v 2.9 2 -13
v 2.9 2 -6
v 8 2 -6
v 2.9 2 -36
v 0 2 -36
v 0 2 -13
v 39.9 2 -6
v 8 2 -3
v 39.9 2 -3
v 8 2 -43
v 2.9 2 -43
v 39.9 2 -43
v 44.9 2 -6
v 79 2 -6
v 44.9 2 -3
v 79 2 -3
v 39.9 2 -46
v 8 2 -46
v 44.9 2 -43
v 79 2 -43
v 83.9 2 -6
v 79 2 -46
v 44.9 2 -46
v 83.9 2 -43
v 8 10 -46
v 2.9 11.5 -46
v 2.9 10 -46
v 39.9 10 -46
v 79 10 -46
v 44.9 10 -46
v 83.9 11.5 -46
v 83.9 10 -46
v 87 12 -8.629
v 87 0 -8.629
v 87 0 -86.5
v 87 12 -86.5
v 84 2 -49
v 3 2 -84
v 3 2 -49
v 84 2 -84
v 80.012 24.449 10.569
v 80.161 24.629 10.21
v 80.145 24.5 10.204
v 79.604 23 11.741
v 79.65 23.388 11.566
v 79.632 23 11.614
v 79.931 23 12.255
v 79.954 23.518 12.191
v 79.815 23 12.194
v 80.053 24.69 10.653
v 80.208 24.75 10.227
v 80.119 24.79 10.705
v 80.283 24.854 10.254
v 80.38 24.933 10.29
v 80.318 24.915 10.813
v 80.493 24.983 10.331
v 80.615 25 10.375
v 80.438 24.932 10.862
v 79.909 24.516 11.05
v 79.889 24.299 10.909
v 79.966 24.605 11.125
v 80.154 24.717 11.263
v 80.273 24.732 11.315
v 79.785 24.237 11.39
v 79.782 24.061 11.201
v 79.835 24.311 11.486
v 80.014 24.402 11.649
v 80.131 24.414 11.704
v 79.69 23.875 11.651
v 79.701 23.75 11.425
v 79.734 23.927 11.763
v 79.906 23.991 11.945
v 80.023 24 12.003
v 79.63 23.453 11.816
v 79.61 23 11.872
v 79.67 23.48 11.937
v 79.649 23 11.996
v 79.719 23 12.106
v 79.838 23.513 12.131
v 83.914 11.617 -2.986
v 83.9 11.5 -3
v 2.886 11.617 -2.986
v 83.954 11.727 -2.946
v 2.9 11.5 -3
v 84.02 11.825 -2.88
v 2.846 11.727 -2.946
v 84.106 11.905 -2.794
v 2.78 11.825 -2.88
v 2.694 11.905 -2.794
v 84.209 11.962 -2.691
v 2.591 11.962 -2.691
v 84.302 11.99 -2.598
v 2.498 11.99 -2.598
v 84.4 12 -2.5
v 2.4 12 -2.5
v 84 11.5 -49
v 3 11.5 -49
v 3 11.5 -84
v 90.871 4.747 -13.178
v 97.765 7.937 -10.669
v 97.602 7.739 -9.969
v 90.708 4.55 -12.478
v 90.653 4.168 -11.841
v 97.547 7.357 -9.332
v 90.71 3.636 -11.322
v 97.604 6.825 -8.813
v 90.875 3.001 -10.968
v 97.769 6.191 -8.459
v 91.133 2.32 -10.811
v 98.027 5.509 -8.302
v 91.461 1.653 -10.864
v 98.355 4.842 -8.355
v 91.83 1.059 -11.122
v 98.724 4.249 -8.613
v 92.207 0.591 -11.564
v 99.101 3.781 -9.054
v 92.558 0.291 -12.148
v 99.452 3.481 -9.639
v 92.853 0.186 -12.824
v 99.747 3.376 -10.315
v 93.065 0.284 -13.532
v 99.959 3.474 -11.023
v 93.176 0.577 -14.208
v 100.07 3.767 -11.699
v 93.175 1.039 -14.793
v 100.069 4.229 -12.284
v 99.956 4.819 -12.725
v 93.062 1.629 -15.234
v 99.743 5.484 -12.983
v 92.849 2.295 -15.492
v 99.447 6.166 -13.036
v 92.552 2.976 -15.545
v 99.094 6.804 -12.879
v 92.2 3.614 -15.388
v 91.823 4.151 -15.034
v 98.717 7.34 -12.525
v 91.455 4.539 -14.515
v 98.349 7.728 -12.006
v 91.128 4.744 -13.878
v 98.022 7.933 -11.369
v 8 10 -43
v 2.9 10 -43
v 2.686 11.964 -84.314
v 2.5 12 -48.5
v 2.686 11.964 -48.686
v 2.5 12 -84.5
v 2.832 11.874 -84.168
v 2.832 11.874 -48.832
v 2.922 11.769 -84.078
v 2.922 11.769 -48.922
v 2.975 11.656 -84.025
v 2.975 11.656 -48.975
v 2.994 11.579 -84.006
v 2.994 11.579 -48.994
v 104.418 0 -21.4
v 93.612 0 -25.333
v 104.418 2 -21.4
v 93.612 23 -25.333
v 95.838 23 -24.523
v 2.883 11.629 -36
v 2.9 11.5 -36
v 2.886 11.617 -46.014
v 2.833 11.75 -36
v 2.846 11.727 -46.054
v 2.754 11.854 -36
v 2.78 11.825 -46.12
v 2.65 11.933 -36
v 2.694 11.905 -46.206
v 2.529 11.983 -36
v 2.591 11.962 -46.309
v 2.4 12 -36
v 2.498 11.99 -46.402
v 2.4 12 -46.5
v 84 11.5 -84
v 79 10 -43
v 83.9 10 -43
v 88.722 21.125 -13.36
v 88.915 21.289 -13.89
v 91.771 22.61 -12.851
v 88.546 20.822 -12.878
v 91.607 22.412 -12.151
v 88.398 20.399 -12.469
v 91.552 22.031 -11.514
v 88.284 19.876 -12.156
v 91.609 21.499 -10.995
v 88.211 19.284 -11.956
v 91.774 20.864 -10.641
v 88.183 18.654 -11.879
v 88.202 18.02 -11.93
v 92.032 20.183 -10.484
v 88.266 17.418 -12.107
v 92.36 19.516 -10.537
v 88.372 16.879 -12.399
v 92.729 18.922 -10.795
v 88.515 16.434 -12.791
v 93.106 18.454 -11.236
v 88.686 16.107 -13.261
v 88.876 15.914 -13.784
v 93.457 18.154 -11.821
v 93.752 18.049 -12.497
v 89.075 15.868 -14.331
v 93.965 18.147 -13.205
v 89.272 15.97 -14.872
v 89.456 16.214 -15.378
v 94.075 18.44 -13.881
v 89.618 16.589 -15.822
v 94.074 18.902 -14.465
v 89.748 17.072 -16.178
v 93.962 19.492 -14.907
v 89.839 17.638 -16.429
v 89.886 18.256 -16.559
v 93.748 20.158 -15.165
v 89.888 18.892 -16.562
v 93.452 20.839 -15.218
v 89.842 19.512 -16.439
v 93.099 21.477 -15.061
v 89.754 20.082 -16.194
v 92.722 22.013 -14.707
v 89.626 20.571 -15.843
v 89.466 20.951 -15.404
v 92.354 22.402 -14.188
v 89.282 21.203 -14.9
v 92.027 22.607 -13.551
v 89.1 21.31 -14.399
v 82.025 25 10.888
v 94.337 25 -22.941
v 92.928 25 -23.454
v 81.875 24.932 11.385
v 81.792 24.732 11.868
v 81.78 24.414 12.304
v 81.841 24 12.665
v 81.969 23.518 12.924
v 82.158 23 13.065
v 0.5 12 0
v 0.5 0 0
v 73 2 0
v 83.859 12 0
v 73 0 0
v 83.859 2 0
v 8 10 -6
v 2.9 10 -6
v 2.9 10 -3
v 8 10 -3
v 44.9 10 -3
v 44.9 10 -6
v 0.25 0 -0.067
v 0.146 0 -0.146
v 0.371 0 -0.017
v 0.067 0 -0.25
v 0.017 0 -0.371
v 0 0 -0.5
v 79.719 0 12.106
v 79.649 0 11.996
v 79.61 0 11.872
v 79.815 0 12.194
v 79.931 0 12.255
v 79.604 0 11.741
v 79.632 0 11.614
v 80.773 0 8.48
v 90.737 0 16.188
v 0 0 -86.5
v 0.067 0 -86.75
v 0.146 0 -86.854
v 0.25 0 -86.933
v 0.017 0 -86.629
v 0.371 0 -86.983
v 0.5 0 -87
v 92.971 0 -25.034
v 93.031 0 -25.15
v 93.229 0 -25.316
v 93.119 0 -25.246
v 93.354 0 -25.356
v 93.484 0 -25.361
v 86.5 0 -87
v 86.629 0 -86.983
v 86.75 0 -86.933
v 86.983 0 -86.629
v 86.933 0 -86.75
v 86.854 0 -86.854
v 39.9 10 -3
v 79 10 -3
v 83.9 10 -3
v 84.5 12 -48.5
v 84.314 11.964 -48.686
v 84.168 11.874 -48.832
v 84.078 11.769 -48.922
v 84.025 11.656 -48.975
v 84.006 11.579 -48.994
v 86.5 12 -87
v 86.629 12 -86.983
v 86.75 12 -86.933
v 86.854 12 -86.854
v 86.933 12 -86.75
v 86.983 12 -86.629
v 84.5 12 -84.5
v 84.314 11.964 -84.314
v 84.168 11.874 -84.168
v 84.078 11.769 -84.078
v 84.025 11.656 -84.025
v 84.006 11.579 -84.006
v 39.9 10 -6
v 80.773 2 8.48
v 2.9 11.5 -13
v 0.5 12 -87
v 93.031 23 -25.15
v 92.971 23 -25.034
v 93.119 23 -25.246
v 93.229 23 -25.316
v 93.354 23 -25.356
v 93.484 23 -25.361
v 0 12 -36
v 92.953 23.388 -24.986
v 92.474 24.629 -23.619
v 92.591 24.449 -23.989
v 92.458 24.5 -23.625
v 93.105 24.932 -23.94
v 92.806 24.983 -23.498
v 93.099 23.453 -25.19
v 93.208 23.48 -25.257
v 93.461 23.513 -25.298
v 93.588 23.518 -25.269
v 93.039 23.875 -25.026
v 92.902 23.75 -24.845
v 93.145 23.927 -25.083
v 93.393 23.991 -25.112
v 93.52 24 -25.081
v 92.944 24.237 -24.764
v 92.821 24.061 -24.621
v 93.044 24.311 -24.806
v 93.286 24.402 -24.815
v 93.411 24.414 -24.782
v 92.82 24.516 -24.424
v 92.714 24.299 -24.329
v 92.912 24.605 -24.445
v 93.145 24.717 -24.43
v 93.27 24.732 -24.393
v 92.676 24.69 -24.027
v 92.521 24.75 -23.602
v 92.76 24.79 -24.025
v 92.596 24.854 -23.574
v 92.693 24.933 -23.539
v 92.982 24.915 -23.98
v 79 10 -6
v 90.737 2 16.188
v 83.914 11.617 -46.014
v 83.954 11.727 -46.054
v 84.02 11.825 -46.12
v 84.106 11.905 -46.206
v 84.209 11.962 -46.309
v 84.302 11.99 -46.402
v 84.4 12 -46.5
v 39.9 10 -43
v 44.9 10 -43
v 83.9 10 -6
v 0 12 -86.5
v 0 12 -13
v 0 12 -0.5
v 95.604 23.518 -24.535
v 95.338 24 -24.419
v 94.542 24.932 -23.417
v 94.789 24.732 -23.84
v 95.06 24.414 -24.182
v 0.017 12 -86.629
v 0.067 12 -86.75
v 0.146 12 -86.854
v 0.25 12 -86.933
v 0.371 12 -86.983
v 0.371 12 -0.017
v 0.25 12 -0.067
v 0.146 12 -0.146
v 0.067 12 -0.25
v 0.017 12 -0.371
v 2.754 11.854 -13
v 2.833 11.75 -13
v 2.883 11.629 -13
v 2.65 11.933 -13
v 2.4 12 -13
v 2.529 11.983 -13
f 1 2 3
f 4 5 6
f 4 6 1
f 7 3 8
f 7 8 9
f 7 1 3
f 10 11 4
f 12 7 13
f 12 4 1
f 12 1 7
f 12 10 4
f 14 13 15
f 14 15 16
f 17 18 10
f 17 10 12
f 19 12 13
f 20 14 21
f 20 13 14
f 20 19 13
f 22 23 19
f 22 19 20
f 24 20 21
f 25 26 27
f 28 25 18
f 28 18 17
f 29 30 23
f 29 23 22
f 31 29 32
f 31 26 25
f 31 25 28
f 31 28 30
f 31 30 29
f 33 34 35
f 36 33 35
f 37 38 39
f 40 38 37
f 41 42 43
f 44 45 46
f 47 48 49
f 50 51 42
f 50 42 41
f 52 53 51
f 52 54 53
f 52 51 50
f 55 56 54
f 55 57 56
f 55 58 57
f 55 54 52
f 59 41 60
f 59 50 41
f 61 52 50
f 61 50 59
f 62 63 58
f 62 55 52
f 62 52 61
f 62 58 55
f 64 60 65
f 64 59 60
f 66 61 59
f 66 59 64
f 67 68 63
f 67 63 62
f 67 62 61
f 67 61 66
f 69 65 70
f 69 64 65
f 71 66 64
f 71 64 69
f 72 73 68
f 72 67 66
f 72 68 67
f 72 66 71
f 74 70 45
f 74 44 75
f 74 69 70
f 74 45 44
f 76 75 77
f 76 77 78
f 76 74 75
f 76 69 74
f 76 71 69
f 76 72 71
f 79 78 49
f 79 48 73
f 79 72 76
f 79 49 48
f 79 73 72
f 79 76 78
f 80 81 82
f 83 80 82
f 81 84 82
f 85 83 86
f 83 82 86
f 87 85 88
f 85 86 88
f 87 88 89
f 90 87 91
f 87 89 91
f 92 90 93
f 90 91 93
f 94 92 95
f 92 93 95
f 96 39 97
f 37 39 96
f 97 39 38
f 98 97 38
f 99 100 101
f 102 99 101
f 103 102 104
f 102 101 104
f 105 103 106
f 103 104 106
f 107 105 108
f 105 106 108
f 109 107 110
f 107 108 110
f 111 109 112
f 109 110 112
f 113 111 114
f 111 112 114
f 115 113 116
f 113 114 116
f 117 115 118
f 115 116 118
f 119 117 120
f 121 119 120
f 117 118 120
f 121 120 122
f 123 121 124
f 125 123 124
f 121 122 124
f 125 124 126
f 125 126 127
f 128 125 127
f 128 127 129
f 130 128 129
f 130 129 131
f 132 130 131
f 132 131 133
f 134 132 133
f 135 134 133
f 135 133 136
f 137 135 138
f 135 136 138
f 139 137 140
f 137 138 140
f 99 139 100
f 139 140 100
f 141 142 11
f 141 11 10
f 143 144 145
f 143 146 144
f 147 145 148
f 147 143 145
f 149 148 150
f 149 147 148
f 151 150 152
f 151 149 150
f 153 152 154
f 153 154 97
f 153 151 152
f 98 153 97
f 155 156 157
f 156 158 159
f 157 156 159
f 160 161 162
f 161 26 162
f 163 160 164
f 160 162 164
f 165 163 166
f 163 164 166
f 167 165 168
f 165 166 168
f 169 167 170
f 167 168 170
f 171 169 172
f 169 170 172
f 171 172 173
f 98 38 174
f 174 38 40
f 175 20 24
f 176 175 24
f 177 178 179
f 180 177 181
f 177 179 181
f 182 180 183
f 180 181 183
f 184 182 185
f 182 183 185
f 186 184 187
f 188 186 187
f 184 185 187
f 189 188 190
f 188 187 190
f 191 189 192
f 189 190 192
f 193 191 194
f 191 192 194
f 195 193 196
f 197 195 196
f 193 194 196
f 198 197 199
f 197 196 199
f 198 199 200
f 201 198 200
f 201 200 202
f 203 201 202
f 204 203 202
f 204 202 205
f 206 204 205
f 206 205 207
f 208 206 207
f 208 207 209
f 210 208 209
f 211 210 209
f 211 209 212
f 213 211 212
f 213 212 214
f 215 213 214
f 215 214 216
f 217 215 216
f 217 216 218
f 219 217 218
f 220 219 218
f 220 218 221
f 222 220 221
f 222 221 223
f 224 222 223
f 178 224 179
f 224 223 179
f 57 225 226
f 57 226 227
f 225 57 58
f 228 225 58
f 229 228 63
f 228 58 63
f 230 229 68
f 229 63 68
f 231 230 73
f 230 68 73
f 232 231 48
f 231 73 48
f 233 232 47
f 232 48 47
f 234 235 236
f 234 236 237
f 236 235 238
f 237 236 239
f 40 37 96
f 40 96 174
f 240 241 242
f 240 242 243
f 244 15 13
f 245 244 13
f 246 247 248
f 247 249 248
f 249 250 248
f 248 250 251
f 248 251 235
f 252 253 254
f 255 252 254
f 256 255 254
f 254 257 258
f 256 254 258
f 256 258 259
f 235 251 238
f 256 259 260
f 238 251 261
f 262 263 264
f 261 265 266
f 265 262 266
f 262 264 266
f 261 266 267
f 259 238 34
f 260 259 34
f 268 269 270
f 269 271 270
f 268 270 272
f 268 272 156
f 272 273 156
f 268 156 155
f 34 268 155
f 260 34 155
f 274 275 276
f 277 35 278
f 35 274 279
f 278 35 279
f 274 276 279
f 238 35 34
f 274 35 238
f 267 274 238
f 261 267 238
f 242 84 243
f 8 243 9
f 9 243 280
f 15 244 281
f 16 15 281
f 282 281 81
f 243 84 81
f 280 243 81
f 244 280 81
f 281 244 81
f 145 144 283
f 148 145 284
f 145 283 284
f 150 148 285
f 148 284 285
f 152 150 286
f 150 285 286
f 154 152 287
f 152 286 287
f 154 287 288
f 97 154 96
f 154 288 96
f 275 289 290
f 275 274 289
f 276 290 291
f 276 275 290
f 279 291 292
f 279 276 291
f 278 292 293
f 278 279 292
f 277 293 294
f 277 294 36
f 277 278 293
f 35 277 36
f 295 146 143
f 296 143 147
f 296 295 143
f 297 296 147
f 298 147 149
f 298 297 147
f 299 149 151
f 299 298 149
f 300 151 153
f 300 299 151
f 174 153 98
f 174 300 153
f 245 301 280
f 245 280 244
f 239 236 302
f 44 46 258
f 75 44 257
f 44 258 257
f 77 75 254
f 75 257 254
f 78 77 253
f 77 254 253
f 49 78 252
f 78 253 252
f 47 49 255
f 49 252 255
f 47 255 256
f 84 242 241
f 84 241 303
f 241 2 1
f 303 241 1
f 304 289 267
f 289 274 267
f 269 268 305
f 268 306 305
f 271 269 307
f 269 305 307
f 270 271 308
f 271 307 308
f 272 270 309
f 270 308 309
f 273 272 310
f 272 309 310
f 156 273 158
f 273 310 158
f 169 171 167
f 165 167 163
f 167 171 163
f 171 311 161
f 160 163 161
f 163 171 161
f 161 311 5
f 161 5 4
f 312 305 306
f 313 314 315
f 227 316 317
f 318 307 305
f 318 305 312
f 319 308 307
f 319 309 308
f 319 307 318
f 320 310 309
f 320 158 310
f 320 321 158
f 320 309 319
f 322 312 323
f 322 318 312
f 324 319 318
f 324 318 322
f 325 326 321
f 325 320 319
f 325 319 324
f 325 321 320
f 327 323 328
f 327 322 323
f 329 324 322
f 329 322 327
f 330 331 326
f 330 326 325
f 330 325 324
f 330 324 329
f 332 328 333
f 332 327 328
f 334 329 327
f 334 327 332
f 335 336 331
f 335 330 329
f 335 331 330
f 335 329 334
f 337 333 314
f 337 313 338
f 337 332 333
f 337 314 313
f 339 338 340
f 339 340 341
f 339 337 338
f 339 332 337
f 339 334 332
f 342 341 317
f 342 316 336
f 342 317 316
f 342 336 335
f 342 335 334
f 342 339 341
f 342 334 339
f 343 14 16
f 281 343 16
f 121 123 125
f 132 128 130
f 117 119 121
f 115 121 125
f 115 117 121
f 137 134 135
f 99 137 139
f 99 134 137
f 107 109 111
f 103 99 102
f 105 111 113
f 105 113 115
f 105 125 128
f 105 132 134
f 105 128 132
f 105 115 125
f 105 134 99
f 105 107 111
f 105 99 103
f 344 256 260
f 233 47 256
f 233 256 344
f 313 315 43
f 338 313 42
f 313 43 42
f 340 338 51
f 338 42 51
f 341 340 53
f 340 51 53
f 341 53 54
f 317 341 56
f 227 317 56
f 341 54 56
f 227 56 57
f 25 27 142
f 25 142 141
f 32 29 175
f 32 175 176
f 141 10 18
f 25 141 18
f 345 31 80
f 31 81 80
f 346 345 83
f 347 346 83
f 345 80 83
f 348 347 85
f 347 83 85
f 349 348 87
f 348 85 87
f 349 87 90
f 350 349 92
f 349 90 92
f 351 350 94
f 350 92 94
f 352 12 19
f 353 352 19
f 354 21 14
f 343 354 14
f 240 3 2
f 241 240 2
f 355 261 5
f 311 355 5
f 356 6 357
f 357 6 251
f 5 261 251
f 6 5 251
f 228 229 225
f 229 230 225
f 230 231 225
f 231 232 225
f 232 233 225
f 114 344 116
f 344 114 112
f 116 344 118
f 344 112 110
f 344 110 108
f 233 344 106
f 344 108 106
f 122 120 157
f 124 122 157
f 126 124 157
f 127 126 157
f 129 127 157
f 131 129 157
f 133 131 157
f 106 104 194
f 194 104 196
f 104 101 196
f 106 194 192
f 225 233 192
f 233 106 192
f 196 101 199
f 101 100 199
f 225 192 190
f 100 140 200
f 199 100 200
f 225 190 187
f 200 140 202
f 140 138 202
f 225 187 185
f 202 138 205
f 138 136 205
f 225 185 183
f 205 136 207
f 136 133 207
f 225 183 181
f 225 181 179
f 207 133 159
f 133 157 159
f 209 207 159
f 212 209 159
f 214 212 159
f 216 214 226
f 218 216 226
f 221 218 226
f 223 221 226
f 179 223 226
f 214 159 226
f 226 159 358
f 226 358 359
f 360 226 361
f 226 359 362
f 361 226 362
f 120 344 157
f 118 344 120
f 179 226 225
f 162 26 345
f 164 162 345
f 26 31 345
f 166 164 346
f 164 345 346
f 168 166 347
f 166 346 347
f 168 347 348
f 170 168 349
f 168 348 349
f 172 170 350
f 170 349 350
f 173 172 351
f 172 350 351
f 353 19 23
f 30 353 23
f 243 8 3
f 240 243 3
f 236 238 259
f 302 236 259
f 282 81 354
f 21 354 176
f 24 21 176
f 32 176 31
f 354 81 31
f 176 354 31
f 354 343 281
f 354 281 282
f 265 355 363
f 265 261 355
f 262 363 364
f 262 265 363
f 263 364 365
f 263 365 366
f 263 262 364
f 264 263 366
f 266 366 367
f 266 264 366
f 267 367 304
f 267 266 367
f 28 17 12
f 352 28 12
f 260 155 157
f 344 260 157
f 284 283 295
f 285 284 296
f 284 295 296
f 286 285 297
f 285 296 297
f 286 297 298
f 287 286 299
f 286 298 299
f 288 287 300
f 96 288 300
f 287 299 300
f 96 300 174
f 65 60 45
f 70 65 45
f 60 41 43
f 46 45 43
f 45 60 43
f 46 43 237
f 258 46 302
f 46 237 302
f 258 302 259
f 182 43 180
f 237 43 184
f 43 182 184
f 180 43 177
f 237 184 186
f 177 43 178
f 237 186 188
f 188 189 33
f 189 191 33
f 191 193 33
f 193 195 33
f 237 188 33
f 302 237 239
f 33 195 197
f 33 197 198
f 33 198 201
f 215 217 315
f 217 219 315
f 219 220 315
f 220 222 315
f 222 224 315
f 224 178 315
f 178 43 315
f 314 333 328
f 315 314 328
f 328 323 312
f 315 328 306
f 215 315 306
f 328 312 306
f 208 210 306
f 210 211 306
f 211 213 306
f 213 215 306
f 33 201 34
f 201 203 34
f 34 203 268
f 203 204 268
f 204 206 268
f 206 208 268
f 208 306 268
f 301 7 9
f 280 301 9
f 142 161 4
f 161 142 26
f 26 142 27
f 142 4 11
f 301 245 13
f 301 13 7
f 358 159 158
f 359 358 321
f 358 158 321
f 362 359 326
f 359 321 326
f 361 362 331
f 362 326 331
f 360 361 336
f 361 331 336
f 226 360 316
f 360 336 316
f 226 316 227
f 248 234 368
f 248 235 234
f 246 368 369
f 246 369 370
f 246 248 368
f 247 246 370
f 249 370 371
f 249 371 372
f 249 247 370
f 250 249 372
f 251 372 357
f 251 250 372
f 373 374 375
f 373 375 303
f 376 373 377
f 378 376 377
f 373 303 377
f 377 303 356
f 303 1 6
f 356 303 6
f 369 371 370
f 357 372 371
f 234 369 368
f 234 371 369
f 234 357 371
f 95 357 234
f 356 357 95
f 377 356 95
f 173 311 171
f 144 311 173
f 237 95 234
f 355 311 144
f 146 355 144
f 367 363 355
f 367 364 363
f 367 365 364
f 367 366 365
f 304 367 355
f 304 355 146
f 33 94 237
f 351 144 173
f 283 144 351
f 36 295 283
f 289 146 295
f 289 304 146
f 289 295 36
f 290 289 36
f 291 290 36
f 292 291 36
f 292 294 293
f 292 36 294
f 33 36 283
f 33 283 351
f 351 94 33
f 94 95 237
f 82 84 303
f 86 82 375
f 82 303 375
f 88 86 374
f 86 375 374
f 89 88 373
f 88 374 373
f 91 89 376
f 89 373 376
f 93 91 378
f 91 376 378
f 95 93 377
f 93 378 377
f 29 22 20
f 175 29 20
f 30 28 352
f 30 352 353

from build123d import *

# Parameters (mm, degrees)
BOSS_EXTRUDE1_DEPTH   = 40
BODY_MOVE_COPY1_ANGLE = 20
BOSS_EXTRUDE2_DEPTH   = 2
SKETCH1_4_W           = 81
SKETCH1_4_H           = 35
BOSS_EXTRUDE3_DEPTH   = 12
SKETCH4_R             = 2.5
CUT_EXTRUDE2_DEPTH    = 8
FILLET1_R             = 2
SKETCH10_W            = 4.9
SKETCH10_H            = 3
SKETCH10_W_2          = 5.1
SKETCH10_W_3          = 5
CUT_EXTRUDE4_DEPTH    = 2
FILLET2_R             = 0.5


with BuildPart() as part:
    # Sketch2 → Boss-Extrude1 (new body)
    with BuildSketch(Plane.XY):
        Polygon((90, 0), (102, 0), (102, 2), (92, 25), (90, 25), align=None)
    extrude(amount=BOSS_EXTRUDE1_DEPTH)


with BuildPart() as part_1:
    # Body-Move/Copy1: moved
    add(part.part.rotate(Axis((95, 0, 20), (0, -1, 0)), BODY_MOVE_COPY1_ANGLE))


with BuildPart() as part_2:
    # Body-Move/Copy2: moved
    add(part_1.part.moved(Location((-4, 0, -25))))

    # Sketch1 → Boss-Extrude2 (add)
    with BuildSketch(Plane(origin=(0, 0, 0), x_dir=(1, 0, 0), z_dir=(0, 1, 0))):
        Polygon((0, 0), (73, 0), (84, -12), (87, 0), (87, 87), (0, 87), align=None)
    extrude(amount=BOSS_EXTRUDE2_DEPTH)

    # Sketch1<4> → Boss-Extrude3 (add)
    with BuildSketch(Plane(origin=(0, 0, 0), x_dir=(1, 0, 0), z_dir=(0, 1, 0))):
        Polygon((8, 43), (8, 46), (39.9, 46), (39.9, 43), (44.9, 43), (44.9, 46), (79, 46), (79, 43), (83.9, 43), (83.9, 6), (79, 6), (79, 3), (44.9, 3), (44.9, 6), (39.9, 6), (39.9, 3), (8, 3), (8, 6), (2.9, 6), (2.9, 13), (0, 13), (0, 0), (87, 0), (87, 87), (0, 87), (0, 36), (2.9, 36), (2.9, 43), align=None)
        with Locations((43.5, 66.5)):
            Rectangle(SKETCH1_4_W, SKETCH1_4_H, mode=Mode.SUBTRACT)
    extrude(amount=BOSS_EXTRUDE3_DEPTH)

    # Sketch4 → Cut-Extrude2 (cut)
    with BuildSketch(Plane(origin=(72.447790922, 33.520577724, 26.368839434), x_dir=(0.30020671045987535, 0.09758957417323016, -0.948868908757974), z_dir=(0.8617639646050662, 0.3987261114144503, 0.31365643207890637))):
        with Locations(Location((42.044187921, -18.952687866, 0), (0, 0, 92.148700458))):
            Circle(SKETCH4_R)
        with Locations(Location((40.341555526, -34.861837527, 0), (0, 0, 92.148700458))):
            Circle(SKETCH4_R)
    extrude(amount=-CUT_EXTRUDE2_DEPTH, mode=Mode.SUBTRACT)

    # Fillet1
    fillet1_edges = [part_2.edges().sort_by_distance(p)[0] for p in [
        (80.40082665, 25, 12.425771842),
        (94.081632383, 25, -25.161932989),
    ]]
    fillet(fillet1_edges, radius=FILLET1_R)

    # Sketch10 → Cut-Extrude4 (cut)
    with BuildSketch(Plane(origin=(0, 12, 0), x_dir=(1, 0, 0), z_dir=(0, 1, 0))):
        with Locations((81.45, 4.5)):
            Rectangle(SKETCH10_W, SKETCH10_H)
        with Locations((42.45, 4.5)):
            Rectangle(SKETCH10_W_2, SKETCH10_H)
        with Locations((42.4, 44.5)):
            Rectangle(SKETCH10_W_3, SKETCH10_H)
        with Locations((81.45, 44.5)):
            Rectangle(SKETCH10_W, SKETCH10_H)
        with Locations((5.45, 44.5)):
            Rectangle(SKETCH10_W_2, SKETCH10_H)
        with Locations((5.45, 4.5)):
            Rectangle(SKETCH10_W_2, SKETCH10_H)
    extrude(amount=-CUT_EXTRUDE4_DEPTH, mode=Mode.SUBTRACT)

    # Fillet2
    fillet2_edges = [part_2.edges().sort_by_distance(p)[0] for p in [
        (43.4, 12, -3),
        (43.5, 12, -49),
        (86.301536896, 25, -6.710100717),
        (79.46113403, 11.5, 12.083751699),
        (93.141939763, 11.5, -25.503953132),
        (79.661484791, 24.414213562, 11.533292506),
        (92.941589001, 24.414213562, -24.95349394),
        (87, 6, -87),
        (0, 6, -87),
        (0, 6, 0),
        (3, 12, -66.5),
        (43.5, 12, -84),
        (84, 12, -66.5),
        (2.9, 12, -41),
        (43.4, 12, -46),
        (83.9, 12, -24.5),
        (2.9, 12, -8),
    ]]
    fillet(fillet2_edges, radius=FILLET2_R)


solid = part_2.part
